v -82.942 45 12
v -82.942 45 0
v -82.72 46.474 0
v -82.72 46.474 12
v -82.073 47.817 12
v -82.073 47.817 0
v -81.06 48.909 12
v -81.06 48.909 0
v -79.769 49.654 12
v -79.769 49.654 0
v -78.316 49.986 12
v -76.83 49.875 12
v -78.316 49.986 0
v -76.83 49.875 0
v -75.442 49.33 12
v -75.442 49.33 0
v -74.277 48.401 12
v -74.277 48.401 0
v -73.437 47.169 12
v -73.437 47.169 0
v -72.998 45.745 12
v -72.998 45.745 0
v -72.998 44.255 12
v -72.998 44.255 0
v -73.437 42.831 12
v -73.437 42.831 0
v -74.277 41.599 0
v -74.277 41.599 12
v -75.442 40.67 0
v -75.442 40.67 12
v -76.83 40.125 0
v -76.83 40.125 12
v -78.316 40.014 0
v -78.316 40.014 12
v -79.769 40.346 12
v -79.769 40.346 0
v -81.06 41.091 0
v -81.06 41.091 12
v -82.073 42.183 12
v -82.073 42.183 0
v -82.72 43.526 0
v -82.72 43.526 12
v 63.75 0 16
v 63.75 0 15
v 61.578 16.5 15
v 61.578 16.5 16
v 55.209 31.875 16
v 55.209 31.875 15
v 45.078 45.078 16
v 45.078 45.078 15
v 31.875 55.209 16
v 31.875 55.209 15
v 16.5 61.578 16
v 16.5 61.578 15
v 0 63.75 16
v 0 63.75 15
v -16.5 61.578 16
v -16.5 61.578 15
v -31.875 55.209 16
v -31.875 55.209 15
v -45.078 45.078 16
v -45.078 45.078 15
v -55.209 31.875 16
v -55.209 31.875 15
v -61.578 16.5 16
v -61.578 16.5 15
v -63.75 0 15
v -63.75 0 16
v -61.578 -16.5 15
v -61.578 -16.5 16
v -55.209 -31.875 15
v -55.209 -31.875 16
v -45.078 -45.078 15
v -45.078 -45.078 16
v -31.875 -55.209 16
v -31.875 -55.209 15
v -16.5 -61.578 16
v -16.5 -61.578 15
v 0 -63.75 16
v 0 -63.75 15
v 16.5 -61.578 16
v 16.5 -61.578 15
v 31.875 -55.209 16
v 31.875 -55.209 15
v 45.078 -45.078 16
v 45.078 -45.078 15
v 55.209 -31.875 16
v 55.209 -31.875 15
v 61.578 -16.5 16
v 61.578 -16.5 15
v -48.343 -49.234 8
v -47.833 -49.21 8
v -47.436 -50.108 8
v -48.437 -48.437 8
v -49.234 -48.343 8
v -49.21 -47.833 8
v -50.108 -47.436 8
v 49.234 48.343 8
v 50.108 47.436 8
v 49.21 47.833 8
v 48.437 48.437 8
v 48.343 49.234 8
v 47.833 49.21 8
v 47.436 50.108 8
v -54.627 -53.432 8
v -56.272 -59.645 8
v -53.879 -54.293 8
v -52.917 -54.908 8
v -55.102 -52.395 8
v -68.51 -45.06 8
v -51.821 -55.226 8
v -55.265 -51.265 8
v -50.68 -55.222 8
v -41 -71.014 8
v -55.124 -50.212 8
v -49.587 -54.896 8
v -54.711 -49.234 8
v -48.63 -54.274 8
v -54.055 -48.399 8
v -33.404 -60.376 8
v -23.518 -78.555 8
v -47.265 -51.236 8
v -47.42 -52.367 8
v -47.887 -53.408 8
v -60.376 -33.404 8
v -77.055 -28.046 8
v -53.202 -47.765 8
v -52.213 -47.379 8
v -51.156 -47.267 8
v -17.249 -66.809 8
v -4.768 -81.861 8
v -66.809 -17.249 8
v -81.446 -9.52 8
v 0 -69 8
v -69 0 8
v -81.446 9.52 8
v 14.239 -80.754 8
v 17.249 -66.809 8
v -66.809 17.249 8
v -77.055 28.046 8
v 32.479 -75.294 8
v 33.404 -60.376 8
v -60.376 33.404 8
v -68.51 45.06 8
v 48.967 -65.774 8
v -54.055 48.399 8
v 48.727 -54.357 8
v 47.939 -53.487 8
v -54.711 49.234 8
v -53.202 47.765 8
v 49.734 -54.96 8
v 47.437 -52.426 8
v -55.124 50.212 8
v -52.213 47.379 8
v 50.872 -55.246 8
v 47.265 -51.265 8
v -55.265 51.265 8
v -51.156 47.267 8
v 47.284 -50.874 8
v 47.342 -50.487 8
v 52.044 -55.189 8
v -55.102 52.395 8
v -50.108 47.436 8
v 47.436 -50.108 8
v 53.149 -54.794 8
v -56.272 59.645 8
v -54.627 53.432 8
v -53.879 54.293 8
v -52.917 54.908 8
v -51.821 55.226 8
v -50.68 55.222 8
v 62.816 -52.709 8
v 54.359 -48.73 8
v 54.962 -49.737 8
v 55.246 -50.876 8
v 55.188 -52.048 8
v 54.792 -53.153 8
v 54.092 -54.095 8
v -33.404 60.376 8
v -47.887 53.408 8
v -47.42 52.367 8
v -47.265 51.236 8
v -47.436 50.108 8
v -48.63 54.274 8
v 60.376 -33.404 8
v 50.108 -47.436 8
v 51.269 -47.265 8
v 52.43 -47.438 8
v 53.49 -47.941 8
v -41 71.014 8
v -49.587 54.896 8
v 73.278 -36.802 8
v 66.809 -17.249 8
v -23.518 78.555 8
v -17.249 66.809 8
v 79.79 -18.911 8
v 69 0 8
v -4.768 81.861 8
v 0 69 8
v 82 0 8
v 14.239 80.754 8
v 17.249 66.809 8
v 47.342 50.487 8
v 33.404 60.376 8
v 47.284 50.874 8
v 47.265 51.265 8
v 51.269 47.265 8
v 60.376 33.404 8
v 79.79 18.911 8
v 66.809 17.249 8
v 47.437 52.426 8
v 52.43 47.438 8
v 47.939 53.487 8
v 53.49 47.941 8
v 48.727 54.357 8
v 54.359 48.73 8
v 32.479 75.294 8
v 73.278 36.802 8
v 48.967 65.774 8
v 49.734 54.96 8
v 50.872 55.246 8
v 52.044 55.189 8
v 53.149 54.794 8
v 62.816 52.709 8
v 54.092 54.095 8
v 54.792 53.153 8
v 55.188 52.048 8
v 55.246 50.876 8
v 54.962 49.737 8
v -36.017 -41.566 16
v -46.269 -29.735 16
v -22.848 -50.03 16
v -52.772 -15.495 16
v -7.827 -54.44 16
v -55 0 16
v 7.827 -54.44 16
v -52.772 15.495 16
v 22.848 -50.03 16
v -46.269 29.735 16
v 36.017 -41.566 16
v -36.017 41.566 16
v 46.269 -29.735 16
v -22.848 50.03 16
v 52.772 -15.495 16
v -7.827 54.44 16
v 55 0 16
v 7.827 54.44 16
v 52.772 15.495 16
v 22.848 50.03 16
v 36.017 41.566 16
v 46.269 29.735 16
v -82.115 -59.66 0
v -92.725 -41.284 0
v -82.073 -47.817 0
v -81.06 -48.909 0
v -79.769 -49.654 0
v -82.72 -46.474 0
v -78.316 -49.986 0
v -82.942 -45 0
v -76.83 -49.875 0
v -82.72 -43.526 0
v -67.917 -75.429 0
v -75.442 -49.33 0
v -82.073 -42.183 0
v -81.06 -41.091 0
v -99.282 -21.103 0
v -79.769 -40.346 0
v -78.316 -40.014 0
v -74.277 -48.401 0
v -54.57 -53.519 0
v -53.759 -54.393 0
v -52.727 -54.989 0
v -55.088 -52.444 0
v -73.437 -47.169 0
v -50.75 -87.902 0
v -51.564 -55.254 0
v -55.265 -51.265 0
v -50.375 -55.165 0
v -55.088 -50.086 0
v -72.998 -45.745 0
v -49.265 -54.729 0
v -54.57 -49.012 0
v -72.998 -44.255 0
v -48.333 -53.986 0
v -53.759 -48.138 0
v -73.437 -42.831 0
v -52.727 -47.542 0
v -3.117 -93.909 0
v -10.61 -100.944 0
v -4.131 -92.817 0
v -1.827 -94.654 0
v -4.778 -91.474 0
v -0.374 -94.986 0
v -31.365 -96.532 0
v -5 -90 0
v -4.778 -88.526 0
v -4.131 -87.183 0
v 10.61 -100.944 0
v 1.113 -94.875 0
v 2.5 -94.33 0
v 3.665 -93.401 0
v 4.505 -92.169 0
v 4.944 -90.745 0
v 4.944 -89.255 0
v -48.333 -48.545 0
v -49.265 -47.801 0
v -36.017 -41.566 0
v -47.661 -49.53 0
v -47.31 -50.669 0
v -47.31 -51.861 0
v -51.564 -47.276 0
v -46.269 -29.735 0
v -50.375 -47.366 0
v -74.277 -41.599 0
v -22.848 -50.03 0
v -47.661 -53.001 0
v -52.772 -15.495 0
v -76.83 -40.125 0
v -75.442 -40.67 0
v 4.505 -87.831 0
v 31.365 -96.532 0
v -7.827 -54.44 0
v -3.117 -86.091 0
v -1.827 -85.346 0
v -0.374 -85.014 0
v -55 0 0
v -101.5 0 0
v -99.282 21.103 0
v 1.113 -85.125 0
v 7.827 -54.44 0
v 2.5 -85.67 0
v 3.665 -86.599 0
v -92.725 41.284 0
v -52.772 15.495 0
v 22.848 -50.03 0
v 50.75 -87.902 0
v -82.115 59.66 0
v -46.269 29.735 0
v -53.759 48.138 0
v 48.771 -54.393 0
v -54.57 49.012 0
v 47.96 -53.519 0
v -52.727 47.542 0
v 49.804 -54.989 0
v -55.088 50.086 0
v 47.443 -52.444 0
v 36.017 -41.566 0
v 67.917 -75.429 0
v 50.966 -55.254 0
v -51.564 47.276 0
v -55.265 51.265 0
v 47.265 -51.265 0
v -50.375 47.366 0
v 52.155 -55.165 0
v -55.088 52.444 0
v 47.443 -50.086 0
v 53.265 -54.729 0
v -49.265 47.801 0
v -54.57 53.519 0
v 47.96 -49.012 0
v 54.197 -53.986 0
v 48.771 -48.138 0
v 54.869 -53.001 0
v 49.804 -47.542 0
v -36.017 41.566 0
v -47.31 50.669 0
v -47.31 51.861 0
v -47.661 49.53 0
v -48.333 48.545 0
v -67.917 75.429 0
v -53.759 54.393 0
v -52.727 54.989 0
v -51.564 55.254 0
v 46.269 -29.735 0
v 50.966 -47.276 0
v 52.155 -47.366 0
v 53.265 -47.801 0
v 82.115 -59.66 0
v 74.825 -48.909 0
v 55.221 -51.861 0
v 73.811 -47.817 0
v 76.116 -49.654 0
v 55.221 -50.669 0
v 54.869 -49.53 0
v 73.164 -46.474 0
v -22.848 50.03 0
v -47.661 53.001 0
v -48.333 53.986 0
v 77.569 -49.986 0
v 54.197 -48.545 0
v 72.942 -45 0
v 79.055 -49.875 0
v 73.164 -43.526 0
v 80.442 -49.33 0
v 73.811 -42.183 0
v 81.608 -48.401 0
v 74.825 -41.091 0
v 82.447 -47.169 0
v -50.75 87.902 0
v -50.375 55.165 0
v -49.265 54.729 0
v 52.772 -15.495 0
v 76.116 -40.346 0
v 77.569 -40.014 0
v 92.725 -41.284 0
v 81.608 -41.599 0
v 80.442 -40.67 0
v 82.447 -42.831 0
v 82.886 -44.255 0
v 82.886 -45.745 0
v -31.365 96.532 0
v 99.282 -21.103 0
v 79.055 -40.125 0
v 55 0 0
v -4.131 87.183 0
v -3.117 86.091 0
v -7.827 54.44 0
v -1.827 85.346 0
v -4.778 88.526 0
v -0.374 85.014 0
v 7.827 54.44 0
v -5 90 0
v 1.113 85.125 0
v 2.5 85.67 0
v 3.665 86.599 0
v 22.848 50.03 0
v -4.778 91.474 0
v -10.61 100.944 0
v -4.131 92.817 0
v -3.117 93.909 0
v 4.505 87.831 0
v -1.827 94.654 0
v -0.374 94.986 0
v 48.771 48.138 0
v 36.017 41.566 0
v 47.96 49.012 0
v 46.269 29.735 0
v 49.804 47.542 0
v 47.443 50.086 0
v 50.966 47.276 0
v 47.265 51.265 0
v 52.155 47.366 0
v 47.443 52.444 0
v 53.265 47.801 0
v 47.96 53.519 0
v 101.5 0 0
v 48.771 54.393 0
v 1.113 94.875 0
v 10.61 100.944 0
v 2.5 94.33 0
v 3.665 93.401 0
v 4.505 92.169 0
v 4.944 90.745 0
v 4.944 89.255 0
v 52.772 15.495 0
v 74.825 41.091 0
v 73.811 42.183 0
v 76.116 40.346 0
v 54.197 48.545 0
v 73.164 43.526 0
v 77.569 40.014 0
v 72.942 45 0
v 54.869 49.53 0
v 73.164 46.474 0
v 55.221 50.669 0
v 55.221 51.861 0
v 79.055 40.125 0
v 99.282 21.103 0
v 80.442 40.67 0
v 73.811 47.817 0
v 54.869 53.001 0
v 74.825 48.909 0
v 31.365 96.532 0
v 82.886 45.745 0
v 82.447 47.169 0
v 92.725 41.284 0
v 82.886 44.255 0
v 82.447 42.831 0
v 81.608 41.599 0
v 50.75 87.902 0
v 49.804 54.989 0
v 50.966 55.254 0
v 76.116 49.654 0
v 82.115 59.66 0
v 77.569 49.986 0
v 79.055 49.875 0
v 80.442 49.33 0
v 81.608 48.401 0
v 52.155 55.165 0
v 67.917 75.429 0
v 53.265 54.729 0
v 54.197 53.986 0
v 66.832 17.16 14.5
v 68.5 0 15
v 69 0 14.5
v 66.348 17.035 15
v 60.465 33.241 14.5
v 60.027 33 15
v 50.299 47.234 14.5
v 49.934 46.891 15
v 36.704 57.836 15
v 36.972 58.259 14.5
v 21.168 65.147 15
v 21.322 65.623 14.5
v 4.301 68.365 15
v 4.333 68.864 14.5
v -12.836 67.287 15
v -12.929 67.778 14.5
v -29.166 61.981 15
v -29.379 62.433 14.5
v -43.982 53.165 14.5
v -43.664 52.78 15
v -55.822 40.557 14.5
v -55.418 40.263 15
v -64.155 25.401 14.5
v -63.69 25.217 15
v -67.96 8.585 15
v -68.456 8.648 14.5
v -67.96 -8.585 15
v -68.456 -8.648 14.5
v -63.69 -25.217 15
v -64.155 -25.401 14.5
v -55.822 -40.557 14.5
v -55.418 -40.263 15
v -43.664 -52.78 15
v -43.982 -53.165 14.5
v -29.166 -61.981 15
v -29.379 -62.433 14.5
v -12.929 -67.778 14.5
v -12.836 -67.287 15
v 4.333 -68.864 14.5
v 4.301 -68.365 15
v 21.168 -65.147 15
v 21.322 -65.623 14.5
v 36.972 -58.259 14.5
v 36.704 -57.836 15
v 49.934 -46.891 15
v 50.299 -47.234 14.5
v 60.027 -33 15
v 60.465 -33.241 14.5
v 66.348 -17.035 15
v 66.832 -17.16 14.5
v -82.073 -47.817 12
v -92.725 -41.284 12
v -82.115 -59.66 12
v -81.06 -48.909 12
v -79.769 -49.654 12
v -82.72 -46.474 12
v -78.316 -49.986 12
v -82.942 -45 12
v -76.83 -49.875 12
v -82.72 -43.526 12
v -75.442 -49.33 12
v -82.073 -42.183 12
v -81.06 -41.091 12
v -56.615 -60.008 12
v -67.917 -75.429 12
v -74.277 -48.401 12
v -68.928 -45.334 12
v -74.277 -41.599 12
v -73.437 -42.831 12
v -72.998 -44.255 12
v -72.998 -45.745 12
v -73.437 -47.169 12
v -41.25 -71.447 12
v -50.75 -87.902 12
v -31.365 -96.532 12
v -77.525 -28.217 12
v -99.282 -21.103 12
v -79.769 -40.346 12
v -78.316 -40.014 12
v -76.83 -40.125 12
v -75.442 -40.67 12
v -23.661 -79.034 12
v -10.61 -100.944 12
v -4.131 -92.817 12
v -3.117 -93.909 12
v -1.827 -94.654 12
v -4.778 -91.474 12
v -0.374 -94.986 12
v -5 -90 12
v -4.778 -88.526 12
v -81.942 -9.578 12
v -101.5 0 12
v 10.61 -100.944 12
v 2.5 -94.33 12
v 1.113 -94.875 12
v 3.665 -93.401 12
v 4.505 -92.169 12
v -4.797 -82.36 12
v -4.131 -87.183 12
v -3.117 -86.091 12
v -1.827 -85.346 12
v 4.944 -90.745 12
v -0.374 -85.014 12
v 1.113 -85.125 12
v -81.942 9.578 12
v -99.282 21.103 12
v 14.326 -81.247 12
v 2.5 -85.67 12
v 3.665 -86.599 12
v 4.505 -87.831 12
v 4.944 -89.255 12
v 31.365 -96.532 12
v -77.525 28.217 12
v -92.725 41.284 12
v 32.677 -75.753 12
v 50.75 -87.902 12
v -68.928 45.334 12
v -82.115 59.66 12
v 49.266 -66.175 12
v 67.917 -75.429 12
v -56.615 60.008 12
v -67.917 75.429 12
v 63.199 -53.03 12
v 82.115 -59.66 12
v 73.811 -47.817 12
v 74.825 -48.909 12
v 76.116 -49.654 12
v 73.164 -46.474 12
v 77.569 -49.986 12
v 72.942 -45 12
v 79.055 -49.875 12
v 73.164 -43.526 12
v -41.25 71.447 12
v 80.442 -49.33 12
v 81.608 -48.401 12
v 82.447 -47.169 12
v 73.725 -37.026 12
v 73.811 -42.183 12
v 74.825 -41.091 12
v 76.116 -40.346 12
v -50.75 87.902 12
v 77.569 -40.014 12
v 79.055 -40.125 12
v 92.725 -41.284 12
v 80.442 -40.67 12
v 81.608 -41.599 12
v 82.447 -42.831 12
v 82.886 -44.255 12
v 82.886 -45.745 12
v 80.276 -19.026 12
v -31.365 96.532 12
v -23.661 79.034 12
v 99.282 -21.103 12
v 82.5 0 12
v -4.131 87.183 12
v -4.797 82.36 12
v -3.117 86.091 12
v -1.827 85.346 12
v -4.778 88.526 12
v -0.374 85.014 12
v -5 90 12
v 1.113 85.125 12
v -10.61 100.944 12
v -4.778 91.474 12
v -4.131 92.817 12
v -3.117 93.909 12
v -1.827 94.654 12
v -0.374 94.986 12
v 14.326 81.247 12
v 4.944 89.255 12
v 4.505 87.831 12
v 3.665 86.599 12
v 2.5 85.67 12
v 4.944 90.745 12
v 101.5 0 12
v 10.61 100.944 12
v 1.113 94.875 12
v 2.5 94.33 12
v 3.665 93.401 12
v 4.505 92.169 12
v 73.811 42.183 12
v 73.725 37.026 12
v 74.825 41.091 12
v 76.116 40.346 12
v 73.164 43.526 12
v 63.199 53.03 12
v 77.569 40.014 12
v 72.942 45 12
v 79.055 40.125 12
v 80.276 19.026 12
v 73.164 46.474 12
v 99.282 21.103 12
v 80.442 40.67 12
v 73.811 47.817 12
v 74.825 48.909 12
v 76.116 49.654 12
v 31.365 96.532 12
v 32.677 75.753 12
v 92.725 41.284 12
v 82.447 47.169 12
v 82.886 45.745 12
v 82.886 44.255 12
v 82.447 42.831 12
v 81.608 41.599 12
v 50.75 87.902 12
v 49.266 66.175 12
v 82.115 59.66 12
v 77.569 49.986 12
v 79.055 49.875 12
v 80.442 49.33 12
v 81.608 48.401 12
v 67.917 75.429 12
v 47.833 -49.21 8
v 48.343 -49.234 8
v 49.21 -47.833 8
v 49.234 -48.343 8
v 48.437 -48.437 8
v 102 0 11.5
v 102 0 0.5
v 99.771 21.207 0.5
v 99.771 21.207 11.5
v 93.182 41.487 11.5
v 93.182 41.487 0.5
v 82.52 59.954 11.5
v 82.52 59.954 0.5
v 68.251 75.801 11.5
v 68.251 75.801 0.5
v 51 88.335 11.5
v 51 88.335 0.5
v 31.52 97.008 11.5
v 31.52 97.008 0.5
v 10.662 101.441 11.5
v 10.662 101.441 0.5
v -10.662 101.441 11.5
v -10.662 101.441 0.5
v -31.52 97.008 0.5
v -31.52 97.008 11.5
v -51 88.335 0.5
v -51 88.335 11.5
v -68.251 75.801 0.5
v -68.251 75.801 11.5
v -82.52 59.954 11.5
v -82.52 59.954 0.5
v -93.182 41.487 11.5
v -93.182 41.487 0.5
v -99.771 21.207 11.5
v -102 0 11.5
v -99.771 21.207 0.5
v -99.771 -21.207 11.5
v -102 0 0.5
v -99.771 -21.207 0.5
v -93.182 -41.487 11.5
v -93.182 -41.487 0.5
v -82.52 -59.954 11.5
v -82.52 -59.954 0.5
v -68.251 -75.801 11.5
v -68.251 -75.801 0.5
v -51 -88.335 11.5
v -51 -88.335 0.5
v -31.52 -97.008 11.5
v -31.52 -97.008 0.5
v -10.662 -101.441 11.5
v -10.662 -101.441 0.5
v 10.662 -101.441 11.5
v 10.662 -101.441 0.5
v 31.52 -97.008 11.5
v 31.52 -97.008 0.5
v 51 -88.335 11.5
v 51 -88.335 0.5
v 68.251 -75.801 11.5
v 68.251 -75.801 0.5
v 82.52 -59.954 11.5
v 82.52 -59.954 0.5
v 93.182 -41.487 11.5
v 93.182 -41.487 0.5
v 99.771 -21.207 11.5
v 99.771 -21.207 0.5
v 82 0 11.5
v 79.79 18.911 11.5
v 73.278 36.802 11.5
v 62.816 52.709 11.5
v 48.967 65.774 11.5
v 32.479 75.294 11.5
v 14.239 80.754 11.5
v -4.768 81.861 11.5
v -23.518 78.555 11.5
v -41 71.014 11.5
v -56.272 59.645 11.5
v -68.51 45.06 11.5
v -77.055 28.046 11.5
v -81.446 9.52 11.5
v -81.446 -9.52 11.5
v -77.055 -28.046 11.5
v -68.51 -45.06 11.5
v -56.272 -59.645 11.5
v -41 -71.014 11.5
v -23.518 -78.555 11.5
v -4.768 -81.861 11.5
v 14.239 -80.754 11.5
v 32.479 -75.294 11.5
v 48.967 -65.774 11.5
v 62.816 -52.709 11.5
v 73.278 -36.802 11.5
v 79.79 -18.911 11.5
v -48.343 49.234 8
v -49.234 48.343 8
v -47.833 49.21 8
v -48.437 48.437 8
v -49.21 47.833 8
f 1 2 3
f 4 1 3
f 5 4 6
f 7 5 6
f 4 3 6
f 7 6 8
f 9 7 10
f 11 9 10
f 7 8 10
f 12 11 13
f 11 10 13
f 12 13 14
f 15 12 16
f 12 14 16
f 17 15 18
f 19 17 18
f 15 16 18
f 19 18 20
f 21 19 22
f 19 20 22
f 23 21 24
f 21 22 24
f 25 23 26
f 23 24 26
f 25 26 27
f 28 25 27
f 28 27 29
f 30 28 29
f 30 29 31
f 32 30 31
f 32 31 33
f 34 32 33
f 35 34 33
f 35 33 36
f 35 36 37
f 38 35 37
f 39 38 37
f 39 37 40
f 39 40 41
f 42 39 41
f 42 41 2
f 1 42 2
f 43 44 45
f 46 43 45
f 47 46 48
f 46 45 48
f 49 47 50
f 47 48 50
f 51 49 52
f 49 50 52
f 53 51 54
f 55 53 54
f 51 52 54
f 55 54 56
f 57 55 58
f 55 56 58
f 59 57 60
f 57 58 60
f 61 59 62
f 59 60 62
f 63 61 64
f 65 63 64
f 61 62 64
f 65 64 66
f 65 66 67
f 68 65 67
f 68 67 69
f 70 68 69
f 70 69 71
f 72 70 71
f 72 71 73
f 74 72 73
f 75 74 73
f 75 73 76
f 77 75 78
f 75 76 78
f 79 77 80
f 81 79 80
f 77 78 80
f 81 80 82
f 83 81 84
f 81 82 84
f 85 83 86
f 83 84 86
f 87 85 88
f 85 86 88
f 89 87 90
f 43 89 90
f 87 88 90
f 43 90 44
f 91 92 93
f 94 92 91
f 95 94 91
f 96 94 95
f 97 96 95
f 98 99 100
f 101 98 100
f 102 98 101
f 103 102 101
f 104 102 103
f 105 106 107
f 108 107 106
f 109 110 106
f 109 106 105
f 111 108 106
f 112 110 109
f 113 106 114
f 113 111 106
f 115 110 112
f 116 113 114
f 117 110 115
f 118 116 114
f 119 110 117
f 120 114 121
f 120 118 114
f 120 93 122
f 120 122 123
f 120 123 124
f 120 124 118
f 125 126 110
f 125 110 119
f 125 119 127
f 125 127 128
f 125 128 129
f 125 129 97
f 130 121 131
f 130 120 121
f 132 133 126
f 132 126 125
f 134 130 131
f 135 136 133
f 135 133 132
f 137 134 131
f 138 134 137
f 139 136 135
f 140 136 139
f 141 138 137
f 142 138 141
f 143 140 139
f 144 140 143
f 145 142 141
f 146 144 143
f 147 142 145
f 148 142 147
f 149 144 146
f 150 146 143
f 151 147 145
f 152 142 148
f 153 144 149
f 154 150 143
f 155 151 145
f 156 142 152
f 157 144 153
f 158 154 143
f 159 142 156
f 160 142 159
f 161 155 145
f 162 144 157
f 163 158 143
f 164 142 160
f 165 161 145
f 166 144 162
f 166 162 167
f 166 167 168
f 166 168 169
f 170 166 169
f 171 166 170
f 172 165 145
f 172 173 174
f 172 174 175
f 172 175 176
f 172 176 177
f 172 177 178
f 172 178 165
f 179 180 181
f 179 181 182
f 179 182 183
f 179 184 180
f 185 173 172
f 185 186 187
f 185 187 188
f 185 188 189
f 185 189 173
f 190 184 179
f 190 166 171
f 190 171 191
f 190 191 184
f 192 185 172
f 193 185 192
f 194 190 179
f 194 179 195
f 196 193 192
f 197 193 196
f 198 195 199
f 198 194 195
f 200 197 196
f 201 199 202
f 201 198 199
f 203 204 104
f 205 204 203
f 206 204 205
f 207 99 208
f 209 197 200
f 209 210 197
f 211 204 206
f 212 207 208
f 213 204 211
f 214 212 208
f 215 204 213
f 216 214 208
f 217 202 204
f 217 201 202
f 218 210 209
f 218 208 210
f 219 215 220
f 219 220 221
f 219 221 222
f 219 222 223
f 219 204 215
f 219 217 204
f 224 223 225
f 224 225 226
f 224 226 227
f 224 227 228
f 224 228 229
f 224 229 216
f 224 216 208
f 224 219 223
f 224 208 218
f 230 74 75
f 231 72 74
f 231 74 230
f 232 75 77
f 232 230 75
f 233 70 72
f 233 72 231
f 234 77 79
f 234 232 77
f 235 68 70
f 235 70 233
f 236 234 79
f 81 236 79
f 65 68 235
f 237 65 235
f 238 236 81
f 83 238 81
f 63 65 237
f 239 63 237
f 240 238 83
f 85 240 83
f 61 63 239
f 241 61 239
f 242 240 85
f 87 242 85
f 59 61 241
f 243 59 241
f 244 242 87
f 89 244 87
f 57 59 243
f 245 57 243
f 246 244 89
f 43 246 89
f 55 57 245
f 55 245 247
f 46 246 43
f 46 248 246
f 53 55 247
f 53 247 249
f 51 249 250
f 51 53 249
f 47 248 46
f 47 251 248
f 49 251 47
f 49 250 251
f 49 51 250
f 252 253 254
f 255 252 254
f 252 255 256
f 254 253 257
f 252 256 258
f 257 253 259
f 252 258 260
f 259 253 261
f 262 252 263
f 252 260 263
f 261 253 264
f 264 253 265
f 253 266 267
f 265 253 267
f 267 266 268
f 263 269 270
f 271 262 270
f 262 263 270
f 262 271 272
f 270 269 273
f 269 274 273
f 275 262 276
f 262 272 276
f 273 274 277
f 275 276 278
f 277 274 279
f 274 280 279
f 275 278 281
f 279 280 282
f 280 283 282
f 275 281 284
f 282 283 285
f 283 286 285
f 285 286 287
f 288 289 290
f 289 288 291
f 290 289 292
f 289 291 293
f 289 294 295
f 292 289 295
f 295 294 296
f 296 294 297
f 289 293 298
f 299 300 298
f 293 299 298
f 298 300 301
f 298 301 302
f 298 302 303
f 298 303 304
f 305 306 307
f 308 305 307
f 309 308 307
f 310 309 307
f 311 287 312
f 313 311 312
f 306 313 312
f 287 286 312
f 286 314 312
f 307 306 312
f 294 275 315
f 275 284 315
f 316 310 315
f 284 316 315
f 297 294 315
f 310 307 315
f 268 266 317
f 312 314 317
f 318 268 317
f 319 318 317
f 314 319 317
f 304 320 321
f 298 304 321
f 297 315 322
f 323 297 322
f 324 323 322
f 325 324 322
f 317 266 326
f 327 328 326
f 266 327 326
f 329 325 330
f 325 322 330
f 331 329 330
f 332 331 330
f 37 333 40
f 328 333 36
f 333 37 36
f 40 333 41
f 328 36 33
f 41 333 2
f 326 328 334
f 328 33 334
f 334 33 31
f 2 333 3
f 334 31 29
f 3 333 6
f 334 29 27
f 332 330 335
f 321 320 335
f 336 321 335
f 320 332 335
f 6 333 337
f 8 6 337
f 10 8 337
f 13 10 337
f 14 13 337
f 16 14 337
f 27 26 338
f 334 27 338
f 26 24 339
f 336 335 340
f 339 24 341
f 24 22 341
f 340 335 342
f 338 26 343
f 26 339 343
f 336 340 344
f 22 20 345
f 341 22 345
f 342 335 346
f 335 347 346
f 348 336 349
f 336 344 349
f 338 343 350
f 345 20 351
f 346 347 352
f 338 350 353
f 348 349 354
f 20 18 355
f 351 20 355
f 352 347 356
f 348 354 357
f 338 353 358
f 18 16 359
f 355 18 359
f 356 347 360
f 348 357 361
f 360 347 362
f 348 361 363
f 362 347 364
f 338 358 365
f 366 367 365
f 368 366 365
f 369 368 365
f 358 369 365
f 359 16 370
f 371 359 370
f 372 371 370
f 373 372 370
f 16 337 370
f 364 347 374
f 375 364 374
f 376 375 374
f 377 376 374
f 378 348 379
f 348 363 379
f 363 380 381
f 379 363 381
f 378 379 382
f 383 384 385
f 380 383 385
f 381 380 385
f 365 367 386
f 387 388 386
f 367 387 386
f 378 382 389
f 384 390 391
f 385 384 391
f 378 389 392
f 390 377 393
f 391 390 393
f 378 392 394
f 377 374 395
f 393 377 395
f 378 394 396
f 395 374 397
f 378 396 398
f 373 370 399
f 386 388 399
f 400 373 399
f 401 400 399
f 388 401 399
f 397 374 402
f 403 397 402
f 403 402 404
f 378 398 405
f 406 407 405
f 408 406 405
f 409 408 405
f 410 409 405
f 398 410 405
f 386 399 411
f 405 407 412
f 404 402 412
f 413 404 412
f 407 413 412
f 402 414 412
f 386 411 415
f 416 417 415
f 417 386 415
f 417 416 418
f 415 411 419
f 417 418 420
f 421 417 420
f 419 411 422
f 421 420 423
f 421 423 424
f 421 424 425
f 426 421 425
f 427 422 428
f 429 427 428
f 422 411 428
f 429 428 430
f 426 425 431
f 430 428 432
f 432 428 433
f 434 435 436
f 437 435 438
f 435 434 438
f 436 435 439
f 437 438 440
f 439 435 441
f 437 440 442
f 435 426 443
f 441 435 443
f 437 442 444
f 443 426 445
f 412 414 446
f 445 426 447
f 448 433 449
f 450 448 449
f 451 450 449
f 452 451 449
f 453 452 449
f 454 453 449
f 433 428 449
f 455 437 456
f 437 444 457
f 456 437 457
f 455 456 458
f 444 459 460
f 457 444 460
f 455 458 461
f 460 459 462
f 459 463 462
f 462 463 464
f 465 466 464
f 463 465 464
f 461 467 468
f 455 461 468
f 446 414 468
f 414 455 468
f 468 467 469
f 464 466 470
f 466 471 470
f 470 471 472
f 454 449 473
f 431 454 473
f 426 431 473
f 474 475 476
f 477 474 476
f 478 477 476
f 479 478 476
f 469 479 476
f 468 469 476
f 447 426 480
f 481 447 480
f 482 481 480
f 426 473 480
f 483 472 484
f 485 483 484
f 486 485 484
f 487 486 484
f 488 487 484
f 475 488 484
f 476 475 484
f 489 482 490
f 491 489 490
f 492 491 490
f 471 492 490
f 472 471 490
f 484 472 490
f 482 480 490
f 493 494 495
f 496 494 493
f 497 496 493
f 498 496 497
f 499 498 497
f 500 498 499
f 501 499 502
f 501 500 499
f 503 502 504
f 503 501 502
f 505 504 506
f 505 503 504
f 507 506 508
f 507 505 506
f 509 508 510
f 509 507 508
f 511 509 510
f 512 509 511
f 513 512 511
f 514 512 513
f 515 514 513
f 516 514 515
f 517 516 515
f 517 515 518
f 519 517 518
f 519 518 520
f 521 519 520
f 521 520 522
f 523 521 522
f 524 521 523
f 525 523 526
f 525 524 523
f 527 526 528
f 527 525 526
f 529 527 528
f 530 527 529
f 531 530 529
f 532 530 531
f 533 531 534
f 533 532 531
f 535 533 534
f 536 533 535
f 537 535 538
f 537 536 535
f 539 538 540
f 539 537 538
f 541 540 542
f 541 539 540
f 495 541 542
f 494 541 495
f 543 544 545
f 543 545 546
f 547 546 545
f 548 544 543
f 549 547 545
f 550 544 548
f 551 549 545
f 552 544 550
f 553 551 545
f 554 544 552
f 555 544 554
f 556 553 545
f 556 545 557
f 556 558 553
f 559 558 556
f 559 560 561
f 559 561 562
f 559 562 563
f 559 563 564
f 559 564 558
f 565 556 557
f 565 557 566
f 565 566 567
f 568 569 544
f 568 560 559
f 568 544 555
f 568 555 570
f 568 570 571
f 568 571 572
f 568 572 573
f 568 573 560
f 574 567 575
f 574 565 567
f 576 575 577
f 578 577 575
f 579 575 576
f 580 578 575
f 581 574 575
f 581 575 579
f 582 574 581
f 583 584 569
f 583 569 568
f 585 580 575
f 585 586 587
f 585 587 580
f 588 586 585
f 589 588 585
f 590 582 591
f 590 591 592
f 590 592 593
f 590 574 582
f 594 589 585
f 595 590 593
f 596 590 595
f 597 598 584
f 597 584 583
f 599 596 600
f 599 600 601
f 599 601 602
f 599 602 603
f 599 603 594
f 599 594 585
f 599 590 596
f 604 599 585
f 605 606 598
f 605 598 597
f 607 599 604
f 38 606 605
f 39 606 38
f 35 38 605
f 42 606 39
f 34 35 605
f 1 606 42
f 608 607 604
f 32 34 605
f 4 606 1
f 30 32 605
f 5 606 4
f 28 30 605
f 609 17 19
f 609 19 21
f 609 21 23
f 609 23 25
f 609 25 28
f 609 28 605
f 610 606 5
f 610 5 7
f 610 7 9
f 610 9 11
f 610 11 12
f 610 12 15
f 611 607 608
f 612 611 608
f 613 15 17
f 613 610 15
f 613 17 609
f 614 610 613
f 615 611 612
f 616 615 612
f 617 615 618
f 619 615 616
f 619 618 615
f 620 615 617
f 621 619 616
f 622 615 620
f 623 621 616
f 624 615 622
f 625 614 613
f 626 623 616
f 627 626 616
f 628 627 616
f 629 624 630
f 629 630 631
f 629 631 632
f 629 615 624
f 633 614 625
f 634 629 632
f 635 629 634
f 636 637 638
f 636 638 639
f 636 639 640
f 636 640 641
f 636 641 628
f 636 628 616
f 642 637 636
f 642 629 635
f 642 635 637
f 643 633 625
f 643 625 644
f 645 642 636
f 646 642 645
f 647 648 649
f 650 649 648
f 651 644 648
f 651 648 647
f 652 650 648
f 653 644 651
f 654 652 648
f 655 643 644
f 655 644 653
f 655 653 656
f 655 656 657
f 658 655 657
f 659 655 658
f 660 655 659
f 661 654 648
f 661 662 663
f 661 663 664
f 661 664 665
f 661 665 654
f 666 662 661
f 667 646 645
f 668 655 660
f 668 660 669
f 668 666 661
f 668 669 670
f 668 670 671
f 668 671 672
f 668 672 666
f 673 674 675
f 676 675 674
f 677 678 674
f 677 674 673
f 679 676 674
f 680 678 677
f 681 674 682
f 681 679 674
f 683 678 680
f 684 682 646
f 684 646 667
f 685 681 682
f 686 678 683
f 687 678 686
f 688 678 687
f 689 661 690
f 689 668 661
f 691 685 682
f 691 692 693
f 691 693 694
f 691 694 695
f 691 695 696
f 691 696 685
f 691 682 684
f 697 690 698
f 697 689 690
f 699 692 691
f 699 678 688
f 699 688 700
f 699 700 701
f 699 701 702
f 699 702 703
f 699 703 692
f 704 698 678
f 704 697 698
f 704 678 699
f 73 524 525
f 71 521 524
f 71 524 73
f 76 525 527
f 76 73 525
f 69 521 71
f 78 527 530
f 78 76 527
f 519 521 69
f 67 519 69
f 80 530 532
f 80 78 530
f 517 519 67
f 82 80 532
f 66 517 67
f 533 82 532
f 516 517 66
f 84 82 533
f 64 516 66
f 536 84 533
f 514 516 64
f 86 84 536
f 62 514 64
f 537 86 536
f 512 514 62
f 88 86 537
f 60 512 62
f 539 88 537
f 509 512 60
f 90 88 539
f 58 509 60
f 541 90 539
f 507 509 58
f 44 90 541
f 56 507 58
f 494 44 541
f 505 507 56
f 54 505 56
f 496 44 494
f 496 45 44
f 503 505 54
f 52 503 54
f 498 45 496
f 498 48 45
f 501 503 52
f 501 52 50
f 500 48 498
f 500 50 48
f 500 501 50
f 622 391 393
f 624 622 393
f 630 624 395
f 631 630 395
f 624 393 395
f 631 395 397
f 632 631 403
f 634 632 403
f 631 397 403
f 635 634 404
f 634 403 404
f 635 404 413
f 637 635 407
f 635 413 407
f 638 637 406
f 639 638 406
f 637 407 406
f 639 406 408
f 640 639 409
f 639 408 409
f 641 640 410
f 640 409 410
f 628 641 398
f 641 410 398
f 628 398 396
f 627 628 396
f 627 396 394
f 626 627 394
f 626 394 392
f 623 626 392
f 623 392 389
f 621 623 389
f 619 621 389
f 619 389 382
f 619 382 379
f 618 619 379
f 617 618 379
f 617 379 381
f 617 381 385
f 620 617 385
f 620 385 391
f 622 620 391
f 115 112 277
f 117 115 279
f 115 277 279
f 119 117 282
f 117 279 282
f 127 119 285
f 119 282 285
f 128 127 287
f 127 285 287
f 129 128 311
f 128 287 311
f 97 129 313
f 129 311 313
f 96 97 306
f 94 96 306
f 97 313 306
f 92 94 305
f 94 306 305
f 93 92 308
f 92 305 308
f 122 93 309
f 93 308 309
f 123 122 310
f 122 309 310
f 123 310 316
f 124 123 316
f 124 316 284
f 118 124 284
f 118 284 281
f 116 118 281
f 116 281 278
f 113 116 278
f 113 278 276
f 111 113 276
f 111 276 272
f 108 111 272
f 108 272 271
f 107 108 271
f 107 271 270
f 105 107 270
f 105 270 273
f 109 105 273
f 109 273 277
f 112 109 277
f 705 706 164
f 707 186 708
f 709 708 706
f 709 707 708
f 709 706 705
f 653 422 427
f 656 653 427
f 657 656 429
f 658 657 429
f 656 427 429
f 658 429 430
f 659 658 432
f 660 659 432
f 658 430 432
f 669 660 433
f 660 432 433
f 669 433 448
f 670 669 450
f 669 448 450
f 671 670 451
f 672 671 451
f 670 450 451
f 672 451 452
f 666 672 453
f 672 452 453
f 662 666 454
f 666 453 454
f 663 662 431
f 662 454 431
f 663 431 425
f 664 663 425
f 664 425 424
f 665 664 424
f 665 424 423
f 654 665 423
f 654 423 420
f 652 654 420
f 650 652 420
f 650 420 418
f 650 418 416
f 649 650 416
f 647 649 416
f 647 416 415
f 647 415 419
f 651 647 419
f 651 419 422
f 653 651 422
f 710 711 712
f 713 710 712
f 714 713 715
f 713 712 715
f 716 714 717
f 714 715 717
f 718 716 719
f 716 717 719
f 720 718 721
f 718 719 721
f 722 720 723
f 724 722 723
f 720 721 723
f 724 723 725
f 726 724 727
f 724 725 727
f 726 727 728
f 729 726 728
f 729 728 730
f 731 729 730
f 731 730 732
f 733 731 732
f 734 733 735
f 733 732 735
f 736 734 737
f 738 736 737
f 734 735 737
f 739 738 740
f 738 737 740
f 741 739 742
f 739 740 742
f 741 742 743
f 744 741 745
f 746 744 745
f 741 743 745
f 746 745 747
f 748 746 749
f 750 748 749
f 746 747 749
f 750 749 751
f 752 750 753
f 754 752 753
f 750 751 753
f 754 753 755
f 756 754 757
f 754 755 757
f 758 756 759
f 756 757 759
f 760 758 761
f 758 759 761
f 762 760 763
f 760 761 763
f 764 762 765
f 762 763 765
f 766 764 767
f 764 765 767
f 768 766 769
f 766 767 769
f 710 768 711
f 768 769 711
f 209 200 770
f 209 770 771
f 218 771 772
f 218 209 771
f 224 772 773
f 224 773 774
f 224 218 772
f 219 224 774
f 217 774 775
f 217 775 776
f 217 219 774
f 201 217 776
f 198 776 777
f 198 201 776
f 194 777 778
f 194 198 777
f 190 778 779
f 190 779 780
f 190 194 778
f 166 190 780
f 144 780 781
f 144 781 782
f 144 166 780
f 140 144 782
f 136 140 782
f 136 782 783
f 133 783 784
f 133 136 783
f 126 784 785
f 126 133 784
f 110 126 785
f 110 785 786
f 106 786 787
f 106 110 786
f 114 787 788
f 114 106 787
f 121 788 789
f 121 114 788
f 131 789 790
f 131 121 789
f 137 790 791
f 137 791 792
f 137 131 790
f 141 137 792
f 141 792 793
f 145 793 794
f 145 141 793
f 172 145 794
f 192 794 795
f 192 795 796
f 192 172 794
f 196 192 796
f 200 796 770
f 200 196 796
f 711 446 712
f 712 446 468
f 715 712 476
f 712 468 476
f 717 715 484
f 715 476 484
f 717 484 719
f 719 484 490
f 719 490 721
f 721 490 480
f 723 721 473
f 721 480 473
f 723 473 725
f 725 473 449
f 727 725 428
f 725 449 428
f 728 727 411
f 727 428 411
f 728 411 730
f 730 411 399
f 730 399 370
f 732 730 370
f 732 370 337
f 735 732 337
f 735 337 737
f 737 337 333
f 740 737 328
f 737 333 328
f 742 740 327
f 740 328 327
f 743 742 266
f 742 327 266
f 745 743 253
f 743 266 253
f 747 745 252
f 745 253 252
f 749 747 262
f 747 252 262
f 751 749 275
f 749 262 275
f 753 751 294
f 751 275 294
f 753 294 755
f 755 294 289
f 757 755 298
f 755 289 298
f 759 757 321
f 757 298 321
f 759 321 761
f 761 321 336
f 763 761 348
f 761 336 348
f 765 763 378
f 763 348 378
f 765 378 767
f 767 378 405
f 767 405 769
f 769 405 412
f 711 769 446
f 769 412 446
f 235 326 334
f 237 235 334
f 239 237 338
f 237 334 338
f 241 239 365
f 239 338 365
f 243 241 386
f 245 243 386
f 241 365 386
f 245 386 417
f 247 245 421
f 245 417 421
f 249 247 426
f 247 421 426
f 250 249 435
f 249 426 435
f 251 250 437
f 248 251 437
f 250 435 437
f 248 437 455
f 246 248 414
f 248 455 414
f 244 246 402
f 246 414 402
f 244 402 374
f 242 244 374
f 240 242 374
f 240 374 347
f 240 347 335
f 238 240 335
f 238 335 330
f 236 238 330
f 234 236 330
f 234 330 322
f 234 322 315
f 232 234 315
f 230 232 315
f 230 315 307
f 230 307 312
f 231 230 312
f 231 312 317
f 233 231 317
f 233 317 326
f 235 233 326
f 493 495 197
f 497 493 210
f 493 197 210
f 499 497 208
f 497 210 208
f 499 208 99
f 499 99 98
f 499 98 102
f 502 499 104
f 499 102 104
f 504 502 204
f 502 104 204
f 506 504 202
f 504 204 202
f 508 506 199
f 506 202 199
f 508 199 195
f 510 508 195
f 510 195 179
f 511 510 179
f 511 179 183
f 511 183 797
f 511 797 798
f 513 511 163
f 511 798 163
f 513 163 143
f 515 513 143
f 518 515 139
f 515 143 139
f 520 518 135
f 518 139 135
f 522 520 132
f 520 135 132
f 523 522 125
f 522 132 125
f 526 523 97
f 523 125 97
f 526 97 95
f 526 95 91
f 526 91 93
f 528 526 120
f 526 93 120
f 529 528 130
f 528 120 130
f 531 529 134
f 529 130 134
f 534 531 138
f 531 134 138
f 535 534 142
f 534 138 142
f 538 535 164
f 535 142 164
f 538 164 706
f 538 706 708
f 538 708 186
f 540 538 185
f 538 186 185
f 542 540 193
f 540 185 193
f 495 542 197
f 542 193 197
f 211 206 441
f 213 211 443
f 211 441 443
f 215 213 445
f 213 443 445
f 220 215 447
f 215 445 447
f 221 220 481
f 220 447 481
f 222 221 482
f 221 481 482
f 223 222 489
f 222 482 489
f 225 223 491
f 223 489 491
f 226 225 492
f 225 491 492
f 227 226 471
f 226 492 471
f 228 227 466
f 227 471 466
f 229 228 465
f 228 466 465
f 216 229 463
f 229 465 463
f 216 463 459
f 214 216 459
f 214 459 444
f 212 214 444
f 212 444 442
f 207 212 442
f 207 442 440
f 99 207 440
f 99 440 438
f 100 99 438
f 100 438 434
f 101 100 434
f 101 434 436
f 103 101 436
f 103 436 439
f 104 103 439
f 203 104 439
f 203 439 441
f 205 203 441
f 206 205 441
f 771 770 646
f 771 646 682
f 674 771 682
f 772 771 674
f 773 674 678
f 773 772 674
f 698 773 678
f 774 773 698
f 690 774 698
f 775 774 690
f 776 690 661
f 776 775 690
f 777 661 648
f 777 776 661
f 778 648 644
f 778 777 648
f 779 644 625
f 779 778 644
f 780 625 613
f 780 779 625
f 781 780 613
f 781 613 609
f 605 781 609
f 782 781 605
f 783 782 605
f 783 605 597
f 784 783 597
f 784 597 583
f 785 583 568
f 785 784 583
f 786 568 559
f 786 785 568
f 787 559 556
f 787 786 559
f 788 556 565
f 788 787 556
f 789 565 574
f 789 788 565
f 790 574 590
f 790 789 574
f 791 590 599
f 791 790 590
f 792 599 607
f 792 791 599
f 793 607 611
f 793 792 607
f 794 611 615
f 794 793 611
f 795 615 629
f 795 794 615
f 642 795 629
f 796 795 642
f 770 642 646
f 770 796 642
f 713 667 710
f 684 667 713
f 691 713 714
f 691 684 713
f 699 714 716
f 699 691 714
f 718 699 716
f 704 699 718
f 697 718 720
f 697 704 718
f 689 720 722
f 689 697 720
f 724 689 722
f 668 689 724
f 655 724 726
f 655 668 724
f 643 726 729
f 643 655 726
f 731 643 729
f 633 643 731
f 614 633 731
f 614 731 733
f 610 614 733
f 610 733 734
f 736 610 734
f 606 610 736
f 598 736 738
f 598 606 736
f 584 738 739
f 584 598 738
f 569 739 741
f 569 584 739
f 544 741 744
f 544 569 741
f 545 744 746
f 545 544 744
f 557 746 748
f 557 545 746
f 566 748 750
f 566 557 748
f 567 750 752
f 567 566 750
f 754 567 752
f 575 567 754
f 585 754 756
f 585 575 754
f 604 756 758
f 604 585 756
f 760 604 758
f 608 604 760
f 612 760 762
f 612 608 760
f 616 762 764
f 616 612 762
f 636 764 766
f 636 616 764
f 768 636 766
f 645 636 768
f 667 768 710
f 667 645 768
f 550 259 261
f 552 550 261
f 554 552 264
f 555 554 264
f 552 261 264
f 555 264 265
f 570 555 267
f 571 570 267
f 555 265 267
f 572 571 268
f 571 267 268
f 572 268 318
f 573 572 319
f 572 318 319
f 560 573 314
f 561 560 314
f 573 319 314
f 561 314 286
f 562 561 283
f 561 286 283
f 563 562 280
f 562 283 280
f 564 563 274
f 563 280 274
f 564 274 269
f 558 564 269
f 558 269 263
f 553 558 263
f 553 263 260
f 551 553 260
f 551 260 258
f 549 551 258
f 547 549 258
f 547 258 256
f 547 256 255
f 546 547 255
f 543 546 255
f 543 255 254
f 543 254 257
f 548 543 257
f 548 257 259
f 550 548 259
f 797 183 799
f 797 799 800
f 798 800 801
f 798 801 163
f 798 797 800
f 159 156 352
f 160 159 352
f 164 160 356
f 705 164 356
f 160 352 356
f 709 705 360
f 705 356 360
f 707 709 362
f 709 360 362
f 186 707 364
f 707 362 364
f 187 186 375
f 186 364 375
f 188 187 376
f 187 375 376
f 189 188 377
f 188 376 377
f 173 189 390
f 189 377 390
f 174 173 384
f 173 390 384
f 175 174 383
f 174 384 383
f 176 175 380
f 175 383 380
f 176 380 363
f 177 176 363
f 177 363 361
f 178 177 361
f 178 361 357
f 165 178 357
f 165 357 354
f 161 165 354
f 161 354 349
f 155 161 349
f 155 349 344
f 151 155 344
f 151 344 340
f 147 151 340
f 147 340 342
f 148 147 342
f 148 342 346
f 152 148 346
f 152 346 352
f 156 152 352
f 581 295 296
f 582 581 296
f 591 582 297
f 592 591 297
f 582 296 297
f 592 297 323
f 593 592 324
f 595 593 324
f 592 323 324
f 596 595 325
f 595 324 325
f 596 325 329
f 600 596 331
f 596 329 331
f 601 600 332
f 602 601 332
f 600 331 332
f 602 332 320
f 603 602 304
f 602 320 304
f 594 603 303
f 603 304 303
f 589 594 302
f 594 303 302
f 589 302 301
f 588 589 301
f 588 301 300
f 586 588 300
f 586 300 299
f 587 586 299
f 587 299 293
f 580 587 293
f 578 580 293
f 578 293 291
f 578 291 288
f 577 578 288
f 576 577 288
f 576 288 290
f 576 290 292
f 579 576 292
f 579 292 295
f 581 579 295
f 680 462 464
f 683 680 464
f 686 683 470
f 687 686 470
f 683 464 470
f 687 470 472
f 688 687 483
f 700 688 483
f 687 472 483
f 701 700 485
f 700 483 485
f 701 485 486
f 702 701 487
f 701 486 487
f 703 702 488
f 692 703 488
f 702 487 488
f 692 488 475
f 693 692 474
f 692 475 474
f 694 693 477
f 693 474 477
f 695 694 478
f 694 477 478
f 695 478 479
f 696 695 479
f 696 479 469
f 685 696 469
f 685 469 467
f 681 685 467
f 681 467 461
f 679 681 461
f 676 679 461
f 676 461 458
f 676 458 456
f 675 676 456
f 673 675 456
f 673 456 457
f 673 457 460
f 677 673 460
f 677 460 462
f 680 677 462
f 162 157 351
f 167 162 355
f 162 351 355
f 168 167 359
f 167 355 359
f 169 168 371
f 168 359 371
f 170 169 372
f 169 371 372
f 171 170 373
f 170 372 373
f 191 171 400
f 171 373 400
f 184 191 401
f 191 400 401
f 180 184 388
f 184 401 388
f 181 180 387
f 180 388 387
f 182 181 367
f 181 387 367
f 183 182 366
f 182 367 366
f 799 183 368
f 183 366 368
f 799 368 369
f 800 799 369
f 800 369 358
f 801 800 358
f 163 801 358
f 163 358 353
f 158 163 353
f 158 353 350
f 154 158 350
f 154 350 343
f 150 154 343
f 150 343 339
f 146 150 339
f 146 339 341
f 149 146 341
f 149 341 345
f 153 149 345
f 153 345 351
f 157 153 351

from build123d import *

# Parameters (mm, degrees)
SKETCH_1_R          = 102
EXTRUDE_1_DEPTH     = 12
SKETCH_2_R          = 69
EXTRUDE_2_DEPTH     = 3
CUT_EXTRUDE_START   = -4
SKETCH_3_R          = 82
SKETCH_3_R_2        = 69
CUT_EXTRUDE_2_DEPTH = 4
SKETCH_4_R          = 63.75
EXTRUDE_3_DEPTH     = 1
CHAMFER_1_SIZE      = 0.5
SKETCH_5_R          = 5
CUT_EXTRUDE_3_DEPTH = 41
SKETCH_6_R          = 55
CUT_EXTRUDE_4_DEPTH = 51
SKETCH_7_R          = 4
CUT_EXTRUDE_5_DEPTH = 8


with BuildPart() as part:
    # 草图1 → 拉伸1 (new body)
    with BuildSketch(Plane.XY):
        Circle(SKETCH_1_R)
    extrude(amount=EXTRUDE_1_DEPTH)

    # 草图2 → 拉伸2 (add)
    with BuildSketch(Plane.XY.offset(12)):
        Circle(SKETCH_2_R)
    extrude(amount=EXTRUDE_2_DEPTH)

    # 草图3 → 切除-拉伸2 (cut)
    with BuildSketch(Plane.XY.offset(12).offset(CUT_EXTRUDE_START)):
        Circle(SKETCH_3_R)
        Circle(SKETCH_3_R_2, mode=Mode.SUBTRACT)
    extrude(amount=CUT_EXTRUDE_2_DEPTH, mode=Mode.SUBTRACT)

    # 草图4 → 拉伸3 (add)
    with BuildSketch(Plane.XY.offset(15)):
        Circle(SKETCH_4_R)
    extrude(amount=EXTRUDE_3_DEPTH)

    # 倒角1
    chamfer_1_edges = [part.edges().sort_by_distance(p)[0] for p in [
        (-82, 0, 12),
        (-102, 0, 0),
        (-102, 0, 12),
        (-69, 0, 15),
    ]]
    chamfer(chamfer_1_edges, length=CHAMFER_1_SIZE)

    # 草图5 → 切除-拉伸3 (cut)
    with BuildSketch(Plane(origin=(0, 0, 0), x_dir=(-1, 0, 0), z_dir=(0, 0, -1))):
        with Locations((0, 90)):
            Circle(SKETCH_5_R)
        with Locations((77.942286341, 45)):
            Circle(SKETCH_5_R)
        with Locations((77.942286341, -45)):
            Circle(SKETCH_5_R)
        with Locations((0, -90)):
            Circle(SKETCH_5_R)
        with Locations((-77.942286341, -45)):
            Circle(SKETCH_5_R)
        with Locations((-77.942286341, 45)):
            Circle(SKETCH_5_R)
    extrude(amount=-CUT_EXTRUDE_3_DEPTH, mode=Mode.SUBTRACT)

    # 草图6 → 切除-拉伸4 (cut)
    with BuildSketch(Plane(origin=(0, 0, 0), x_dir=(-1, 0, 0), z_dir=(0, 0, -1))):
        Circle(SKETCH_6_R)
    extrude(amount=-CUT_EXTRUDE_4_DEPTH, mode=Mode.SUBTRACT)

    # 草图7 → 切除-拉伸5 (cut)
    with BuildSketch(Plane(origin=(0, 0, 0), x_dir=(-1, 0, 0), z_dir=(0, 0, -1))):
        with Locations((51.265241636, 51.265241636)):
            Circle(SKETCH_7_R)
        with Locations((51.265241636, -51.265241636)):
            Circle(SKETCH_7_R)
        with Locations((-51.265241636, -51.265241636)):
            Circle(SKETCH_7_R)
        with Locations((-51.265241636, 51.265241636)):
            Circle(SKETCH_7_R)
    extrude(amount=-CUT_EXTRUDE_5_DEPTH, mode=Mode.SUBTRACT)


solid = part.part
